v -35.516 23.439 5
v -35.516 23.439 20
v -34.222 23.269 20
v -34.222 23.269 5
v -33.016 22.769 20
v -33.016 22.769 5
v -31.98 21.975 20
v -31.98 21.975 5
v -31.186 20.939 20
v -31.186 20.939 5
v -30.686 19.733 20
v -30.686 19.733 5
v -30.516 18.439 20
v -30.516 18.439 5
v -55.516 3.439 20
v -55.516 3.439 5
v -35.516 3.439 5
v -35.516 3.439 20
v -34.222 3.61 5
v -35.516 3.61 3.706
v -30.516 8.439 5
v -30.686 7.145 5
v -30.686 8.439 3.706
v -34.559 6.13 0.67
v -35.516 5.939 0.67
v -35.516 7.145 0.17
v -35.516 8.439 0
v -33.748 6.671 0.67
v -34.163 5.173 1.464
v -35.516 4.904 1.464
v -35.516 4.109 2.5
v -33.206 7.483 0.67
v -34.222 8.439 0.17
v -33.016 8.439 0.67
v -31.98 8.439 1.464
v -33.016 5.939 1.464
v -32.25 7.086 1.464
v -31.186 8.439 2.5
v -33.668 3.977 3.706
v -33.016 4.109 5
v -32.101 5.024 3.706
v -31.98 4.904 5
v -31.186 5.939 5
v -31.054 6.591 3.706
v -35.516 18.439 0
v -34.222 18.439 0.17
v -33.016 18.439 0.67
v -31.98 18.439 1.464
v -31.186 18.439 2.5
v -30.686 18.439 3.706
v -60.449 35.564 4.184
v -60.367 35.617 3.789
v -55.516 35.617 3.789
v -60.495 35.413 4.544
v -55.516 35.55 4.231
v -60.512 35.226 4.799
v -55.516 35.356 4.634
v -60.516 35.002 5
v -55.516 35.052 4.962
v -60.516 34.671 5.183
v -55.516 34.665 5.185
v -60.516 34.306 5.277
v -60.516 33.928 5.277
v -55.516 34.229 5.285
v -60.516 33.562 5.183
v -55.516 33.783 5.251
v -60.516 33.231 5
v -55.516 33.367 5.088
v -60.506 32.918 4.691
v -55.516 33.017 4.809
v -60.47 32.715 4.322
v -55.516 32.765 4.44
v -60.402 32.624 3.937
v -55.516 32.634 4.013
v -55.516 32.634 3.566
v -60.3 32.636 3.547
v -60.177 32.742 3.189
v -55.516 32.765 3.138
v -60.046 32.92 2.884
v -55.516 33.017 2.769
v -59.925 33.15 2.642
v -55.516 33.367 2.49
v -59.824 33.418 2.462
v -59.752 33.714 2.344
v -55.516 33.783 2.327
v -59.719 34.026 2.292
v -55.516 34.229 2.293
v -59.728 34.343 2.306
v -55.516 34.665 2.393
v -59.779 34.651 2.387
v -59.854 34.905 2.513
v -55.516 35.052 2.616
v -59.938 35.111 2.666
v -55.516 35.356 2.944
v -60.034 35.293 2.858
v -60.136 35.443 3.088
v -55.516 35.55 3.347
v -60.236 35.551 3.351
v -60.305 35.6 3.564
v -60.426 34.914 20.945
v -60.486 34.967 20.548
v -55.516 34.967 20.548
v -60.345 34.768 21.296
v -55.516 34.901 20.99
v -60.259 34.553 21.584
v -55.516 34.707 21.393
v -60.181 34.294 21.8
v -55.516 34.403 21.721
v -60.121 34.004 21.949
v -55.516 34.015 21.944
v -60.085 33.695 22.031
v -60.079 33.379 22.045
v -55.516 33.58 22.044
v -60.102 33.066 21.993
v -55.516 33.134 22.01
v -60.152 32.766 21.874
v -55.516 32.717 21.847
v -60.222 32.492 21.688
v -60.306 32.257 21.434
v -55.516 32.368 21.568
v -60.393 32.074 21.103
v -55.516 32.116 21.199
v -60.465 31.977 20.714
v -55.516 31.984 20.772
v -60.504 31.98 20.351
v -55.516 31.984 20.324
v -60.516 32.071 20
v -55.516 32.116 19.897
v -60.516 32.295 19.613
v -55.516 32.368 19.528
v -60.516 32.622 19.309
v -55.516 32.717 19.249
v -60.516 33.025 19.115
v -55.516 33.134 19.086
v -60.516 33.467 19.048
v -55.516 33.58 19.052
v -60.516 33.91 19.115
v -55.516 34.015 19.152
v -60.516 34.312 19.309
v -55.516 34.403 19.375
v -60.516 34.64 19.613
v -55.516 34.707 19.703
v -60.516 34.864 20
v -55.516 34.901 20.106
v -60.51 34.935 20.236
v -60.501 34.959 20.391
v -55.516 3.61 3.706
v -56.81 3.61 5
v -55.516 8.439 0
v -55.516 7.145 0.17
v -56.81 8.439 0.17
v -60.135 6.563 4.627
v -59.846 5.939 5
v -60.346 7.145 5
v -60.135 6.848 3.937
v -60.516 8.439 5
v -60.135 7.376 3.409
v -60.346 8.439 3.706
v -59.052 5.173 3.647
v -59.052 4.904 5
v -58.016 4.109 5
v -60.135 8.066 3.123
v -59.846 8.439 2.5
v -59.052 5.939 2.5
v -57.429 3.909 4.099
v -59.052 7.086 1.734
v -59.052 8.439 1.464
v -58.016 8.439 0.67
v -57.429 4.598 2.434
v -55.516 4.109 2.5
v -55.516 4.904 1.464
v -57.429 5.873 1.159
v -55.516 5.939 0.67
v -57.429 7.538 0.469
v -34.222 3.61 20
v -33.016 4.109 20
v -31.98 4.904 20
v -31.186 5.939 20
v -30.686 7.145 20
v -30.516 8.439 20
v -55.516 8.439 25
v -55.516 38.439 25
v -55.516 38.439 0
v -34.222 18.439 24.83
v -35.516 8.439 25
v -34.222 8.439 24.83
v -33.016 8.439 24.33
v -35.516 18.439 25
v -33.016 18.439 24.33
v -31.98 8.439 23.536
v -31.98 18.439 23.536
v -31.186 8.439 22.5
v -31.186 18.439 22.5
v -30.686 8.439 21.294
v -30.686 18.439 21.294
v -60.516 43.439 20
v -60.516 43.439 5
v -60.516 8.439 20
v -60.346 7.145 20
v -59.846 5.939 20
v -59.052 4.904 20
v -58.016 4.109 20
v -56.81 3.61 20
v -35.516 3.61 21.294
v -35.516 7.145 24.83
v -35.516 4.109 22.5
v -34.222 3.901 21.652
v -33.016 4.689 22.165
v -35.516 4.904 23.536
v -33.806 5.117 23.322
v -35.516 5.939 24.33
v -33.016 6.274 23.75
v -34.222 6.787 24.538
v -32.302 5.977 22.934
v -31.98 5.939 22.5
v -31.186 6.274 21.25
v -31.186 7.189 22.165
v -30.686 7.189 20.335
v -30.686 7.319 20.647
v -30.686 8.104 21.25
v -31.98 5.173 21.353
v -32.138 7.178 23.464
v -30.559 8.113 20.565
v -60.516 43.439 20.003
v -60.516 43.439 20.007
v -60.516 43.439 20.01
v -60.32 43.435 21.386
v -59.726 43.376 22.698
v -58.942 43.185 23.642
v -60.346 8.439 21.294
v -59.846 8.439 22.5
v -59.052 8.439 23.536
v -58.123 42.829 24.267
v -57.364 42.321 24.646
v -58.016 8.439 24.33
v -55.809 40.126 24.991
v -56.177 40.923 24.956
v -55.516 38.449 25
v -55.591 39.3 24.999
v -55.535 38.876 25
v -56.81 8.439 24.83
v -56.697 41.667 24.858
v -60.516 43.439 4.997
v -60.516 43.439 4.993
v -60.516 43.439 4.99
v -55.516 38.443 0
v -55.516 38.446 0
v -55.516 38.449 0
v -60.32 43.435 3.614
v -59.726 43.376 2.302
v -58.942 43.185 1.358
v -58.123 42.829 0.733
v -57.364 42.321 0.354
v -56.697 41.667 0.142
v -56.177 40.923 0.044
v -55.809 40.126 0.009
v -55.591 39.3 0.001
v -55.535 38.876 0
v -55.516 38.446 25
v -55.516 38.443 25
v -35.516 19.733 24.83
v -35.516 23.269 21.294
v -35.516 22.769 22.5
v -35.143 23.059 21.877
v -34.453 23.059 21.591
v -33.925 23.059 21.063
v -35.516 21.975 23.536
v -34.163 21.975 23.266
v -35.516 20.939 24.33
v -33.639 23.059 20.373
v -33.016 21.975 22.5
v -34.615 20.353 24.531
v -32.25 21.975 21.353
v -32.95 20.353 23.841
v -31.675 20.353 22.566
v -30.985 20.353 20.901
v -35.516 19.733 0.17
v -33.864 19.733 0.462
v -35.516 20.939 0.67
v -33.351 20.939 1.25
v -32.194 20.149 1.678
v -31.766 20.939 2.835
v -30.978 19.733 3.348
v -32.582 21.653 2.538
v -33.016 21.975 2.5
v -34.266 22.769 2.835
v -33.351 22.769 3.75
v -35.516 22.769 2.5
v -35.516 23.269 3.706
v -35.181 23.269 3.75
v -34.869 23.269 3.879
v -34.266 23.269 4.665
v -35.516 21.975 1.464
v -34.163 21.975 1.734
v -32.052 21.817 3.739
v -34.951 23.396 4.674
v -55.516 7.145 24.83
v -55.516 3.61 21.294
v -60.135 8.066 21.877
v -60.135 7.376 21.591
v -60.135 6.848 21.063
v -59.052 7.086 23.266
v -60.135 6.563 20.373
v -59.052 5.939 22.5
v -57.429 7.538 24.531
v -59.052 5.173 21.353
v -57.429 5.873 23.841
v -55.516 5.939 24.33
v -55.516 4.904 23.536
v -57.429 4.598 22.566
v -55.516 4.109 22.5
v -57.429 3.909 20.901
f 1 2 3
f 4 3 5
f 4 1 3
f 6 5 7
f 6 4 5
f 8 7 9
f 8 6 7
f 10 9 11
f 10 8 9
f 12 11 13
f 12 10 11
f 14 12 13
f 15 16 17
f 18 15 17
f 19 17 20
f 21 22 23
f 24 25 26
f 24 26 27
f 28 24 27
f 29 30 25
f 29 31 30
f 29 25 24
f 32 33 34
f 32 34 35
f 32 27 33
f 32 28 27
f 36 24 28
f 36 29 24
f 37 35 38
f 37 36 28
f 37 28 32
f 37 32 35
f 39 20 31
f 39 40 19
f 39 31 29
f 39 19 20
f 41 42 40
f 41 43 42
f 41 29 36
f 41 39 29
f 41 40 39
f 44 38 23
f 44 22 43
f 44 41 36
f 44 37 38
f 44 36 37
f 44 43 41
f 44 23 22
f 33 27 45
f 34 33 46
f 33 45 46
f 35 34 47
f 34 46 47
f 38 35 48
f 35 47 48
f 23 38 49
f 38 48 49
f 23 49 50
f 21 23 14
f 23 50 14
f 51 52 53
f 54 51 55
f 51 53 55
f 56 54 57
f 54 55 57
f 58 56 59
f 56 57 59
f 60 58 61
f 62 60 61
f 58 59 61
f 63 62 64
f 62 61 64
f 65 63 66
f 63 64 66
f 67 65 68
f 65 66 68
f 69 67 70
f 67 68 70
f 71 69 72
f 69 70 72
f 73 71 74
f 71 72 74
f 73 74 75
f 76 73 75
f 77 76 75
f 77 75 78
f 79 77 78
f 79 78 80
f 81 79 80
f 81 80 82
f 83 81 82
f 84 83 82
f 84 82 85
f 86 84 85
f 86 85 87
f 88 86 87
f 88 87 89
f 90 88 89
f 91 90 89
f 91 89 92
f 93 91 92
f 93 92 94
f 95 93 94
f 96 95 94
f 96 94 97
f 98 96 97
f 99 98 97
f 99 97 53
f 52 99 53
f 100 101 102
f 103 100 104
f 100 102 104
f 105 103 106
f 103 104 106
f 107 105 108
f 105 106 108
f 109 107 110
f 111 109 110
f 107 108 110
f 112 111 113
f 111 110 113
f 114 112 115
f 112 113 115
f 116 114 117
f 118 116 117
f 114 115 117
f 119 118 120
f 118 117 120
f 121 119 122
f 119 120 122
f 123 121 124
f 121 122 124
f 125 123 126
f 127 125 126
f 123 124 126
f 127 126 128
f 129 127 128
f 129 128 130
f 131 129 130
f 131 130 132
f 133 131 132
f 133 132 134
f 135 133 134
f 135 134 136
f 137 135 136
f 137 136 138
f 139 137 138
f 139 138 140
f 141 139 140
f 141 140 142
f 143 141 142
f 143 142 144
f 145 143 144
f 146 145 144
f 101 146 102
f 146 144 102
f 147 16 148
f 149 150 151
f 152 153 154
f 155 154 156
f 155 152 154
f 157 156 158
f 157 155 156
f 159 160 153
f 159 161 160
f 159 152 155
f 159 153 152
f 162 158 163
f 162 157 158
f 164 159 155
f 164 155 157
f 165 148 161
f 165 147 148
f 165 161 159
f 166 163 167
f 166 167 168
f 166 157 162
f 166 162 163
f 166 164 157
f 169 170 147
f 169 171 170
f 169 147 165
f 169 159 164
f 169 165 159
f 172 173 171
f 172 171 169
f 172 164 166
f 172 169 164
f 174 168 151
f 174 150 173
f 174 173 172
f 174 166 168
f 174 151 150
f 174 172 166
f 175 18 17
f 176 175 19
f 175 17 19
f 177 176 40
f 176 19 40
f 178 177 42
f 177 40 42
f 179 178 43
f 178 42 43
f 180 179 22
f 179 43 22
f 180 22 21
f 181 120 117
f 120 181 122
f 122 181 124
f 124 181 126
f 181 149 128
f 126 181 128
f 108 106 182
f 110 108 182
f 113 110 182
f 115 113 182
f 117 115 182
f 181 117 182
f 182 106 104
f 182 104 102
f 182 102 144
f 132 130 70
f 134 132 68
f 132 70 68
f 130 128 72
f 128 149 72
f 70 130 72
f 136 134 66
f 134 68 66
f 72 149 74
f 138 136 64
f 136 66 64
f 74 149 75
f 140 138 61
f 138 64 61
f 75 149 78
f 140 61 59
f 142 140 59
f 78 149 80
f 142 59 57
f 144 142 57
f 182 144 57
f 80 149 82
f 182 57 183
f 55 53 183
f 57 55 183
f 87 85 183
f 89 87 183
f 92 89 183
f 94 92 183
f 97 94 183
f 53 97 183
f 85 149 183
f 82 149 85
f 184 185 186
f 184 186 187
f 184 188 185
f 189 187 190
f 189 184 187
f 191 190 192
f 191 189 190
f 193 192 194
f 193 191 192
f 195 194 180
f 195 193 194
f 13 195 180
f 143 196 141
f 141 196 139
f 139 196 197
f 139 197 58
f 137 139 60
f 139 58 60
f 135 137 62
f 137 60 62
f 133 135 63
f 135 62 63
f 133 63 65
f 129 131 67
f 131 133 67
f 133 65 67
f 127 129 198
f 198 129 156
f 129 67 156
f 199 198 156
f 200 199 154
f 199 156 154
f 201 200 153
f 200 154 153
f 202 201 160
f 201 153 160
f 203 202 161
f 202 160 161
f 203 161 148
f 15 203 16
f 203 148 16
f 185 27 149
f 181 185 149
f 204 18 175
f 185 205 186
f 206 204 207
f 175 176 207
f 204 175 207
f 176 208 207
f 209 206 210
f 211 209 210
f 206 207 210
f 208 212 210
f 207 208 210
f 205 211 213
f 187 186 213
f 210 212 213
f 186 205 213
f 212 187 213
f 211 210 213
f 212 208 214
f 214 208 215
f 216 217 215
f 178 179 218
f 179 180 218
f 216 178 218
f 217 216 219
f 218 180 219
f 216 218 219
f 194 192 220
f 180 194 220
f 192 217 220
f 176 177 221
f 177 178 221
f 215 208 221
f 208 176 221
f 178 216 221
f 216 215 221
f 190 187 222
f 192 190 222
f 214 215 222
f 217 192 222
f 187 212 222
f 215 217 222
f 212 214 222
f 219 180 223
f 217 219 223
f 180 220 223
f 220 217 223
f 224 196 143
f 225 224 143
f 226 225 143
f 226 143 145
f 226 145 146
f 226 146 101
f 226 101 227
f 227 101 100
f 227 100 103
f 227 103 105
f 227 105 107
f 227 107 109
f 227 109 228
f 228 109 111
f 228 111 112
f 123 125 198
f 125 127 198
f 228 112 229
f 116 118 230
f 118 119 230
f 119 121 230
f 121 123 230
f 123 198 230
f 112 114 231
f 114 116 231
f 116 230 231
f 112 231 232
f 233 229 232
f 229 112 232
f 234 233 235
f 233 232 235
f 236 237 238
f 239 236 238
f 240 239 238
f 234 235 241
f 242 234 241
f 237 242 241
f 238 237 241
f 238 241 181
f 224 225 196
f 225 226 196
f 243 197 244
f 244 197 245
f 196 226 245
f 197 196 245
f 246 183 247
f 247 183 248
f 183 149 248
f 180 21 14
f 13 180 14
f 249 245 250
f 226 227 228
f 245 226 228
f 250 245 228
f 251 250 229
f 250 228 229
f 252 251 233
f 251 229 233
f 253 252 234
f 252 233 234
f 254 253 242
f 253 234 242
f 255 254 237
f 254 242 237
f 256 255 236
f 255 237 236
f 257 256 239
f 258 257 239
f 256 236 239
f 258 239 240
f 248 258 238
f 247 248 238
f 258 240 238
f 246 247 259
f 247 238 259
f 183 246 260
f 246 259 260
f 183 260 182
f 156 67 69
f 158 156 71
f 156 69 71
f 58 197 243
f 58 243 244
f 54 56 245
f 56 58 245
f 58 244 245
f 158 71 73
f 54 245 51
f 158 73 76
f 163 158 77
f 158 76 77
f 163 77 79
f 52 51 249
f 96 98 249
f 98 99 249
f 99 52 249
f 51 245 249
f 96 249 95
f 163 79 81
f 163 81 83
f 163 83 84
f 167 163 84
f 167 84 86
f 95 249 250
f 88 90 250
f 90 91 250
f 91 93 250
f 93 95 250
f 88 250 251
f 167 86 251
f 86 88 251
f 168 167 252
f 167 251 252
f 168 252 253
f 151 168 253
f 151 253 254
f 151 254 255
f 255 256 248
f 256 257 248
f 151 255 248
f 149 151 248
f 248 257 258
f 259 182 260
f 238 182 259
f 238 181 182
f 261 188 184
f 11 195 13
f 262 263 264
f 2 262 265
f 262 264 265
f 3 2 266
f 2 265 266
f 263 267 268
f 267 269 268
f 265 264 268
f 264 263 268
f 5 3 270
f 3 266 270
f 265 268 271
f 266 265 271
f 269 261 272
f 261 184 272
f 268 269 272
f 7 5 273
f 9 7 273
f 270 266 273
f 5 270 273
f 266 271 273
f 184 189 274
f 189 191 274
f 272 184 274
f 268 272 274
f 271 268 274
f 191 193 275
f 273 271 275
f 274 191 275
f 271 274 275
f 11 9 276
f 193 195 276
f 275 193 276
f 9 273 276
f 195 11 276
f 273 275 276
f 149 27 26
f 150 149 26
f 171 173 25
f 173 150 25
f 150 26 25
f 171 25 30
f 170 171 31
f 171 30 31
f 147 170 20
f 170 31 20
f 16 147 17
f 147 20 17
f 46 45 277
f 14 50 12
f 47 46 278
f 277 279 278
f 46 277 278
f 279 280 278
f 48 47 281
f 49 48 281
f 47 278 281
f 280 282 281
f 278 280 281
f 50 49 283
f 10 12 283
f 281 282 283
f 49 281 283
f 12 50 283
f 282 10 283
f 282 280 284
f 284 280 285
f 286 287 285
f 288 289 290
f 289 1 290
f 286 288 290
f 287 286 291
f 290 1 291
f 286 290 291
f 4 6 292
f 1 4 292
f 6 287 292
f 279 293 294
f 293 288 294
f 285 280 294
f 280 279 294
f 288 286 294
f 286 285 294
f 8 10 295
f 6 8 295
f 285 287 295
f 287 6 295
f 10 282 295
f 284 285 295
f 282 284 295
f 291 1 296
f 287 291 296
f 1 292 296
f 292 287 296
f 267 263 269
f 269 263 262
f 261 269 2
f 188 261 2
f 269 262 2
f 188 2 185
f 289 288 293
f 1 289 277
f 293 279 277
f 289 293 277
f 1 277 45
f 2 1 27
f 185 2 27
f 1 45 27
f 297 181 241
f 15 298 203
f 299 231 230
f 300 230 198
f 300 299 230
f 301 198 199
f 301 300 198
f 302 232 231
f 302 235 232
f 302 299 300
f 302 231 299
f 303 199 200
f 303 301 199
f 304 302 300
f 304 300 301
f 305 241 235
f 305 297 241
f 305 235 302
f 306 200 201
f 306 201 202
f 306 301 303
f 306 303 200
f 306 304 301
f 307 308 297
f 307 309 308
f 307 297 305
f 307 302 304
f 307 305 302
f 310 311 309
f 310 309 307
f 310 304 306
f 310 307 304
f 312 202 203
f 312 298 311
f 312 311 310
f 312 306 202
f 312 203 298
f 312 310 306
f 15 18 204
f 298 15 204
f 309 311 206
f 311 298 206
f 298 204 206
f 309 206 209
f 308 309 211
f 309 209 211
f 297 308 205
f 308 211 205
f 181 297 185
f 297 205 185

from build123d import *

# Parameters (mm, degrees)
F1_DEPTH    = 25
F2_R        = 4.99999
F3_T1_DEPTH = 40.00001
F3_T3_DEPTH = 45.00001
F3_T6_ANGLE = 90
F4_R        = 4.99999
F5_R        = 4.99999
F6_R        = 4.99999
F7_T1_DEPTH = 27.50001
F7_T3_DEPTH = 25.0000100044
F7_T6_ANGLE = 90
F7_T8_ANGLE = 233.2969892316
F9_R        = 1.5
F10_DEPTH   = 6
F11_DEPTH   = 6


# Not quite as in the source:
# - a fillet or chamfer that OpenCascade refuses, or shapes differently, is made with other operations: its cross-section is extruded or revolved along the edge and cut away or added
# - a fillet or chamfer is up to 0.001 mm smaller than in the source, because OpenCascade refuses the exact size


with BuildPart() as f1:
    # F0 (on Top) → F1 (new body)
    with BuildSketch(Plane.XY):
        Polygon((-55.5160288679, 43.4392371902), (-60.5160288679, 43.4392371902), (-60.5160288679, 3.4392371902), (-30.5160288679, 3.4392371902), (-30.5160288679, 23.4392371902), (-35.5160288679, 23.4392371902), (-35.5160288679, 8.4392371902), (-55.5160288679, 8.4392371902), align=None)
    extrude(amount=F1_DEPTH)

    # F2 (radius 5 in the source; OpenCascade refuses exactly that, so slightly less here)
    f2_edges = [f1.edges().sort_by_distance(p)[0] for p in [
        (-45.516029, 3.439237, 25),
    ]]
    fillet(f2_edges, radius=F2_R)

    # F3: fillet of radius 5 on 1 edges, made by hand

    # F3_s2 → F3_t1 (cut)
    with BuildSketch(Plane.XZ.offset(-35.9392371902)):
        with BuildLine():
            ThreePointArc((-35.5160288679, 25), (-31.980494962, 23.5355339059), (-30.5160288679, 20))
            Line((-30.5160288679, 20), (-30.5160288679, 25))
            Line((-30.5160288679, 25), (-35.5160288679, 25))
        make_face()
    extrude(amount=F3_T1_DEPTH, mode=Mode.SUBTRACT)

    # F3_s4 → F3_t3 (cut)
    with BuildSketch(Plane.XY.offset(-12.5)):
        with BuildLine():
            ThreePointArc((-35.5160288679, 3.4392371902), (-31.980494962, 4.9037032843), (-30.5160288679, 8.4392371902))
            Line((-30.5160288679, 8.4392371902), (-30.5160288679, 3.4392371902))
            Line((-30.5160288679, 3.4392371902), (-35.5160288679, 3.4392371902))
        make_face()
    extrude(amount=F3_T3_DEPTH, mode=Mode.SUBTRACT)

    # F3_s5 → F3_t6 (revolve, cut)
    with BuildSketch(Plane.XY.offset(20.00001)):
        with BuildLine():
            ThreePointArc((-35.5160288679, 3.4392371902), (-31.9804984975, 4.9036997488), (-30.5160288679, 8.4392271902))
            Line((-30.5160288679, 8.4392271902), (-30.5160288679, 3.4392371902))
            Line((-30.5160288679, 3.4392371902), (-35.5160288679, 3.4392371902))
        make_face()
    revolve(axis=Axis((-30.5160288679, 8.4392271902, 20.00001), (-1, 0, 0)), revolution_arc=F3_T6_ANGLE, mode=Mode.SUBTRACT)

    # F4 (radius 5 in the source; OpenCascade refuses exactly that, so slightly less here)
    f4_edges = [f1.edges().sort_by_distance(p)[0] for p in [
        (-30.516029, 15.939237, 0),
    ]]
    fillet(f4_edges, radius=F4_R)

    # F5 (radius 5 in the source; OpenCascade refuses exactly that, so slightly less here)
    f5_edges = [f1.edges().sort_by_distance(p)[0] for p in [
        (-60.516029, 25.939232, 25),
    ]]
    fillet(f5_edges, radius=F5_R)

    # F6 (radius 5 in the source; OpenCascade refuses exactly that, so slightly less here)
    f6_edges = [f1.edges().sort_by_distance(p)[0] for p in [
        (-55.516029, 43.439237, 12.5),
    ]]
    fillet(f6_edges, radius=F6_R)

    # F7: fillet of radius 5 on 4 edges, made by hand

    # F7_s2 → F7_t1 (cut)
    with BuildSketch(Plane.XY.offset(-7.50001)):
        with BuildLine():
            ThreePointArc((-35.5160288679, 23.4392371902), (-31.980494962, 21.9747710962), (-30.5160288679, 18.4392371902))
            Line((-30.5160288679, 18.4392371902), (-30.5160288679, 23.4392371902))
            Line((-30.5160288679, 23.4392371902), (-35.5160288679, 23.4392371902))
        make_face()
    extrude(amount=F7_T1_DEPTH, mode=Mode.SUBTRACT)

    # F7_s4 → F7_t3 (cut)
    with BuildSketch(Plane.YZ.offset(-48.0160288701)):
        with BuildLine():
            ThreePointArc((18.4392371902, 0), (21.9747710962, 1.4644660941), (23.4392371902, 5))
            Line((23.4392371902, 5), (23.4392371902, 0))
            Line((23.4392371902, 0), (18.4392371902, 0))
        make_face()
    extrude(amount=F7_T3_DEPTH, mode=Mode.SUBTRACT)

    # F7_s5 → F7_t6 (revolve, cut)
    with BuildSketch(Plane.YZ.offset(-35.5160188679)):
        with BuildLine():
            ThreePointArc((18.4392371902, 0), (21.9747675606, 1.4644625585), (23.4392371902, 4.99999))
            Line((23.4392371902, 4.99999), (23.4392371902, 0))
            Line((23.4392371902, 0), (18.4392371902, 0))
        make_face()
    revolve(axis=Axis((-35.5160188679, 23.4392371902, 4.99999), (0, -1, 0)), revolution_arc=F7_T6_ANGLE, mode=Mode.SUBTRACT)

    # F7_s7 → F7_t8 (revolve, cut)
    with BuildSketch(Plane(origin=(-32.4130099886, 0, 24.1625626894), x_dir=(0, 1, 0), z_dir=(0.8017442393, 0, -0.5976672777))):
        with BuildLine():
            ThreePointArc((23.4392371902, -5.1918835033), (21.9747710962, -8.7274174092), (18.4392371902, -10.1918835033))
            Line((18.4392371902, -10.1918835033), (23.4392371902, -10.1918835033))
            Line((23.4392371902, -10.1918835033), (23.4392371902, -5.1918835033))
        make_face()
    revolve(axis=Axis((-35.516028868, 23.4392371902, 19.9999999999), (0, 1, 0)), revolution_arc=F7_T8_ANGLE, mode=Mode.SUBTRACT)

    # F9 (on offset) → F10 (cut)
    with BuildSketch(Plane.YZ.offset(-55)):
        with Locations((33.4674492478, 20.548062399)):
            Circle(F9_R)
    extrude(amount=-F10_DEPTH, mode=Mode.SUBTRACT)

    # F9 (on offset) → F11 (cut)
    with BuildSketch(Plane.YZ.offset(-55)):
        with Locations((33.4674492478, 20.548062399)):
            Circle(F9_R)
        with Locations((34.116756171, 3.7890784442)):
            Circle(F9_R)
    extrude(amount=-F11_DEPTH, mode=Mode.SUBTRACT)


solid = f1.part
